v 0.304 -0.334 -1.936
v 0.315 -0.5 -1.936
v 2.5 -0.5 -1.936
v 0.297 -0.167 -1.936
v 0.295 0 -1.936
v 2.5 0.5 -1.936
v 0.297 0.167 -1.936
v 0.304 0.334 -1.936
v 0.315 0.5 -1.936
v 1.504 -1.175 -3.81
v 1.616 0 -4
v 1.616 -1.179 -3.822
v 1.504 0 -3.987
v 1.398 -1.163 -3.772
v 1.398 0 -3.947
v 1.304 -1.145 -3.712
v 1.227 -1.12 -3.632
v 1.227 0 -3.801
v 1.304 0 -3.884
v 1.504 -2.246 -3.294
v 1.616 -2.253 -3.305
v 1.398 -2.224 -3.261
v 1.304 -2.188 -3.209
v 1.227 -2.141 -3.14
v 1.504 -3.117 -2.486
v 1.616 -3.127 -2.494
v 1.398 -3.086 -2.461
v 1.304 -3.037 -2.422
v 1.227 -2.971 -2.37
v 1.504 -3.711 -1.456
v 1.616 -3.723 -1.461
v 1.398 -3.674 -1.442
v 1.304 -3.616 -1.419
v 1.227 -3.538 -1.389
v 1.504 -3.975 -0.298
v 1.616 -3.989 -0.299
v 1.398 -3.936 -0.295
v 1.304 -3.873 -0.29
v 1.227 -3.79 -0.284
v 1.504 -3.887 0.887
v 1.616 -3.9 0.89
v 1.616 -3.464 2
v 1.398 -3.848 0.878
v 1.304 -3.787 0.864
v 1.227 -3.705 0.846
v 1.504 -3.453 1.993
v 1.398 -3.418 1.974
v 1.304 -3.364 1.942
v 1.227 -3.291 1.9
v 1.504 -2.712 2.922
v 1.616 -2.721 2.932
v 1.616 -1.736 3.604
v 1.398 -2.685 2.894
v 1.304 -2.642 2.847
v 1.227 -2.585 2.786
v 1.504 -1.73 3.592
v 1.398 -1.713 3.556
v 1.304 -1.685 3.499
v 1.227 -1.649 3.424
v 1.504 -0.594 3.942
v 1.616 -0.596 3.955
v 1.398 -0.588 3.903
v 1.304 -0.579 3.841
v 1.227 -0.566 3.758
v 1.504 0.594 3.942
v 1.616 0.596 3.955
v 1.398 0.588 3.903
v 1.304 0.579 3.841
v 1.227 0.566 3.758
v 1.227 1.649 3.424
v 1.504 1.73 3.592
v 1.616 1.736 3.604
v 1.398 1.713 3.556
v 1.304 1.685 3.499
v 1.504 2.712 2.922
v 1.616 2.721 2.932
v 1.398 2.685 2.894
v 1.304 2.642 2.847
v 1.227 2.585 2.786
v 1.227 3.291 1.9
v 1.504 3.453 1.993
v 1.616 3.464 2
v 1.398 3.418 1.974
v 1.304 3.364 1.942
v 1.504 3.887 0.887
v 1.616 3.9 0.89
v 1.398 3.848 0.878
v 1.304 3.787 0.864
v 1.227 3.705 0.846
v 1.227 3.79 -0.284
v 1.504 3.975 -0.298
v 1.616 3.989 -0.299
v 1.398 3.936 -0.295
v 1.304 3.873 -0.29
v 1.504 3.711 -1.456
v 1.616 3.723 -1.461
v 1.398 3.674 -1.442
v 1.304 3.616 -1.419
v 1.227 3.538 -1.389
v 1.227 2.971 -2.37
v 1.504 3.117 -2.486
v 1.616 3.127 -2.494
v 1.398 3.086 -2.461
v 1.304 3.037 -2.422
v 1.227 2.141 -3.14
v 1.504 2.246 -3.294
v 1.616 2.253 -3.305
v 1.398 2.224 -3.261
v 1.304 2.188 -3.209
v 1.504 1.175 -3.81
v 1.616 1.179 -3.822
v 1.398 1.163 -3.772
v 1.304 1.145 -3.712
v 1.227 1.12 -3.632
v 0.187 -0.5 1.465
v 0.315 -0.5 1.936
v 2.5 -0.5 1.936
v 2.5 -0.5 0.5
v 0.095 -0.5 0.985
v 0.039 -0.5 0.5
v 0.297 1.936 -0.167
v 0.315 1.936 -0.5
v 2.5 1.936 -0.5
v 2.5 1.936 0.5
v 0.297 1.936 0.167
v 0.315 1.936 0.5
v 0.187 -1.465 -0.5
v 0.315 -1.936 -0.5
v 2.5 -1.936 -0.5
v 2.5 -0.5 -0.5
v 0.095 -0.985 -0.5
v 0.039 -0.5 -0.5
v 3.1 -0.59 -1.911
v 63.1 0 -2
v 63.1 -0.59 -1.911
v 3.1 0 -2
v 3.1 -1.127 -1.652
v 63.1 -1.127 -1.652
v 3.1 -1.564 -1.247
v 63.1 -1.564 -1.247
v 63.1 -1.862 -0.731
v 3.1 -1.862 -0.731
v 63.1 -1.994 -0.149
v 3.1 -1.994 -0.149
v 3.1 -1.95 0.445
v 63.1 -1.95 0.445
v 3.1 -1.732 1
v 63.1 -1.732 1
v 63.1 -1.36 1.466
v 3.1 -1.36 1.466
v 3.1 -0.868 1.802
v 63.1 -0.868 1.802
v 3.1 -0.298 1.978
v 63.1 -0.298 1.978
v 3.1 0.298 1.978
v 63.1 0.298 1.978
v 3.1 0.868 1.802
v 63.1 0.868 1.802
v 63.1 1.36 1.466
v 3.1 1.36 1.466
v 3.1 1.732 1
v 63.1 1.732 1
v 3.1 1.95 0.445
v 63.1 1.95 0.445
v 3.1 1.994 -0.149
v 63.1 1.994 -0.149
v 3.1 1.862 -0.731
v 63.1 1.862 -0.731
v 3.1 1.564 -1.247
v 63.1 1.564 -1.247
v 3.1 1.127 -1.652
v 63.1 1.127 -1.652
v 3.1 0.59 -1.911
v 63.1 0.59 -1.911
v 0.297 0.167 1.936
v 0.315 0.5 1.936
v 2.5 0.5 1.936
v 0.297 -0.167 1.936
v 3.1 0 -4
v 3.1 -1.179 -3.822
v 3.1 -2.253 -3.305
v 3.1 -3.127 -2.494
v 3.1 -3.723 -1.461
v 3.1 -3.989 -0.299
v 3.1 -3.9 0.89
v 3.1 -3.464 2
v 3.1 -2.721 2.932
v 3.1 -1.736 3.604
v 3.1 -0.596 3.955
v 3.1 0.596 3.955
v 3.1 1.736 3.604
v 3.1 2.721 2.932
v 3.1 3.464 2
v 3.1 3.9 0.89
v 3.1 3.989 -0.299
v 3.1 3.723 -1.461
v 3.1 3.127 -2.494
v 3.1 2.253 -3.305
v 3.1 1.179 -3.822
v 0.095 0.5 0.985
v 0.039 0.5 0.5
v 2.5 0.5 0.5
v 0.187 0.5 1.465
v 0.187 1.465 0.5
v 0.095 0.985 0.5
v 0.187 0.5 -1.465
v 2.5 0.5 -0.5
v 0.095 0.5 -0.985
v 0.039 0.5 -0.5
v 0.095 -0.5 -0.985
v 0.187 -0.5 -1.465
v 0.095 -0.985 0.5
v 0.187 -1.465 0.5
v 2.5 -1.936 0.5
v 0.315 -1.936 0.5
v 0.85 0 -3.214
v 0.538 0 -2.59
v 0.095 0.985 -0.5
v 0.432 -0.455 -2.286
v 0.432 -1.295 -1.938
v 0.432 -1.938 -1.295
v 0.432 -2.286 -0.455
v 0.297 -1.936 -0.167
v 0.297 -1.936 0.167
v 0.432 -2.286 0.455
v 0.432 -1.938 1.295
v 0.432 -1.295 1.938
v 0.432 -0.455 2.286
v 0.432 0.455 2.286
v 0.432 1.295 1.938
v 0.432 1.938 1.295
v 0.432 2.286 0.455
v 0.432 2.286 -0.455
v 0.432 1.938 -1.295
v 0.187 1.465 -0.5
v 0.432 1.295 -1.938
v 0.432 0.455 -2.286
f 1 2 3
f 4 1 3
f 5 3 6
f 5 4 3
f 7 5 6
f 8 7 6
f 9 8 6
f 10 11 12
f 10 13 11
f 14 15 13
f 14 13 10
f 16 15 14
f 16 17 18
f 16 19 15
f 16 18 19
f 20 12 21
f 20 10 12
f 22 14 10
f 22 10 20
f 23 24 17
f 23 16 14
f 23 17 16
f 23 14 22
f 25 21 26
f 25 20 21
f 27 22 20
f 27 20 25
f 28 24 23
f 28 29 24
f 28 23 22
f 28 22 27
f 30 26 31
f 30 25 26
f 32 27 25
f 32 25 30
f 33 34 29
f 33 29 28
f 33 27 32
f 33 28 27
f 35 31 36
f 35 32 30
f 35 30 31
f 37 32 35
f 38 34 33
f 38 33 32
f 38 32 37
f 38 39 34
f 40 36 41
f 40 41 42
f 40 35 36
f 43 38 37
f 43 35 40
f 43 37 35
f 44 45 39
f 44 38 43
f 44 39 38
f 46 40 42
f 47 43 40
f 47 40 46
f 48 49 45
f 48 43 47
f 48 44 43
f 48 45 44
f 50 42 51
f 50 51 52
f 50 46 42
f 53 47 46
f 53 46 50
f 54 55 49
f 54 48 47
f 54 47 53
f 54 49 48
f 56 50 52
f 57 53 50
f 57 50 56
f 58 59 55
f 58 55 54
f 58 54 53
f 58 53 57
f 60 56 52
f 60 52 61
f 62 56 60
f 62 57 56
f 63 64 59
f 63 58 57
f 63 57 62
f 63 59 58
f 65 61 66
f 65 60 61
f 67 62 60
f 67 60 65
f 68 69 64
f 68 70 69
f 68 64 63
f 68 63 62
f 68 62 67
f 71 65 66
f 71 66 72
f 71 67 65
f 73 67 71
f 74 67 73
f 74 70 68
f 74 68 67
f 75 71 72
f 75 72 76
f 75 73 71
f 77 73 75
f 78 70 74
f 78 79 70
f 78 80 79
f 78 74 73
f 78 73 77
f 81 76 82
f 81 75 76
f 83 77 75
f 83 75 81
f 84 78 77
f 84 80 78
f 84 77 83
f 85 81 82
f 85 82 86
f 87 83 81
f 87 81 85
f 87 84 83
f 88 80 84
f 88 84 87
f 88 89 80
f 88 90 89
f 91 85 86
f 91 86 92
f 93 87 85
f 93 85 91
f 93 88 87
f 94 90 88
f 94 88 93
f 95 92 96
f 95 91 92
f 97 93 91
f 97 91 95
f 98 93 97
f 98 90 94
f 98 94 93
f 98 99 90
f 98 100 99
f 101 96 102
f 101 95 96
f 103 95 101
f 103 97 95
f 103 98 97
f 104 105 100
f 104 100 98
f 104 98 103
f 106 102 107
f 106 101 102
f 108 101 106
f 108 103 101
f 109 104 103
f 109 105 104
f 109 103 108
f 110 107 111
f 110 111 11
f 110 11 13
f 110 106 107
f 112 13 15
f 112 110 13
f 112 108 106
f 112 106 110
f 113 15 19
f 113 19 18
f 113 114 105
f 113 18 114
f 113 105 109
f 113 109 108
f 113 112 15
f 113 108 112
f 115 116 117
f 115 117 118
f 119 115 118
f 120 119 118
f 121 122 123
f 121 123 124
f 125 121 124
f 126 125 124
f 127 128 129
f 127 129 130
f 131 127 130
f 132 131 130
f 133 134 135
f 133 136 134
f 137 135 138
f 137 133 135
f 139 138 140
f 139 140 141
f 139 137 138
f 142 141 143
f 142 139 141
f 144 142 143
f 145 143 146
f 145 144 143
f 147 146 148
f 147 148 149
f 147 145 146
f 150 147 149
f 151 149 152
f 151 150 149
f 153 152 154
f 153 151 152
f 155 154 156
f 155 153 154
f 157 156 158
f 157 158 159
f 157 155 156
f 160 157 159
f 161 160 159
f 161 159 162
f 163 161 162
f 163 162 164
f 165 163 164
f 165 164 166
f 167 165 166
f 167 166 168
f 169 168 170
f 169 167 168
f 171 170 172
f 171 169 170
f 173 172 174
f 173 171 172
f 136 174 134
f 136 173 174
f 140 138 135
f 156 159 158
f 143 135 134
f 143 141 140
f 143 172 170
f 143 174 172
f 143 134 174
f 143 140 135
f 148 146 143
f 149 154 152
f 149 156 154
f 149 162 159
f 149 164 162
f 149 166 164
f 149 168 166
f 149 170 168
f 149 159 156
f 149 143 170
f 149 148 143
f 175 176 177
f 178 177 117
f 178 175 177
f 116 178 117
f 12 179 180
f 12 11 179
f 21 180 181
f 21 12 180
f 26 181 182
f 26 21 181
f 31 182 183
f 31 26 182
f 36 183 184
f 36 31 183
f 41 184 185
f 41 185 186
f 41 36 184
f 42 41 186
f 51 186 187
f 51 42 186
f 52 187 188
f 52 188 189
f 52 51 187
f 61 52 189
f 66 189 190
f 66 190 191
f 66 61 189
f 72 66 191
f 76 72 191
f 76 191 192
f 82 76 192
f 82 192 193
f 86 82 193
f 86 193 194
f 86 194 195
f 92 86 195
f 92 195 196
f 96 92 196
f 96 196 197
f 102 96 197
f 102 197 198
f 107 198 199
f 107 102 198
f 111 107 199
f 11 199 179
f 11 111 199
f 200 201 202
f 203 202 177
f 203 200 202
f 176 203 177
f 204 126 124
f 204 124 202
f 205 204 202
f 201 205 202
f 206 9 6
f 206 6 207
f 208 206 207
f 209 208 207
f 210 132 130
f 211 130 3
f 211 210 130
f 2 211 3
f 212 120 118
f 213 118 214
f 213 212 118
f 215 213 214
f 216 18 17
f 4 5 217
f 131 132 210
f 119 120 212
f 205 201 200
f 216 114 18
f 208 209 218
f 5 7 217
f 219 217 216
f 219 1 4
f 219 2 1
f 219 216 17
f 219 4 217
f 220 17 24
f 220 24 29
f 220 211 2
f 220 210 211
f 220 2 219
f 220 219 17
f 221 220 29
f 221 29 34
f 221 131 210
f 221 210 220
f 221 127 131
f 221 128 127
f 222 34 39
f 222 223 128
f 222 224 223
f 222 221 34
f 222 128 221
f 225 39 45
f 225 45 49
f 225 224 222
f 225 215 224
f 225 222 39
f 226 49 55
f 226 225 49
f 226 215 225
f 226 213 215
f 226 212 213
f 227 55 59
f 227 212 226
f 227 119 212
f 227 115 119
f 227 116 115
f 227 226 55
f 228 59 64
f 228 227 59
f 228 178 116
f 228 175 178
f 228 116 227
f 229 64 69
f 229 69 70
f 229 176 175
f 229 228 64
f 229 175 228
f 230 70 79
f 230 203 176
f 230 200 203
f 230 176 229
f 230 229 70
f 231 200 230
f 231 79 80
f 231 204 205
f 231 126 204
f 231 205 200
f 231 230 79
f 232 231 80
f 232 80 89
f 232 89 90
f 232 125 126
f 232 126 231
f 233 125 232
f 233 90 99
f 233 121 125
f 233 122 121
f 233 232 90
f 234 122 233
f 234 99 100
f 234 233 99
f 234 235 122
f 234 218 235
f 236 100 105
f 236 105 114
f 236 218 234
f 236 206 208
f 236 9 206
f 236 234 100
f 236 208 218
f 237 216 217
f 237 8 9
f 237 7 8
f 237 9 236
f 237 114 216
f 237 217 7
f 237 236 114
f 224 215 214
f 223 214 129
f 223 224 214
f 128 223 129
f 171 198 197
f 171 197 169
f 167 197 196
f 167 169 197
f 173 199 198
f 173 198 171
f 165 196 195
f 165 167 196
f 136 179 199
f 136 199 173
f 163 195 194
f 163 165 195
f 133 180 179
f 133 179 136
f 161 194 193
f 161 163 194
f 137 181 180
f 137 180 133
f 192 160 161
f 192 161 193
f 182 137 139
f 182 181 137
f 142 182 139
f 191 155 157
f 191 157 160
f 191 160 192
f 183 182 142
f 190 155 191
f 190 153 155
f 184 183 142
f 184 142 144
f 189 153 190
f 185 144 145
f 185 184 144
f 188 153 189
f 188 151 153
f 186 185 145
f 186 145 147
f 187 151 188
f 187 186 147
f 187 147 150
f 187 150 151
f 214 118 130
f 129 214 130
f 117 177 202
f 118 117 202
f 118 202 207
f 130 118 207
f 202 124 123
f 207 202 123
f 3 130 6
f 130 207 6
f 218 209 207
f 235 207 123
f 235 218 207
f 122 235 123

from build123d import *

# Parameters (mm, degrees)
CUT_EXTRUDE4_DEPTH = 2.5


with BuildPart() as part:
    # Sketch1 → Revolve1 (revolve)
    with BuildSketch(Plane.XY, mode=Mode.PRIVATE) as revolve1_sk:
        with BuildLine():
            Line((3.1, 2), (3.1, 4))
            Line((3.1, 4), (1.616353821, 4))
            ThreePointArc((1.616353821, 4), (1.397629036, 3.947269784), (1.226960106, 3.800664452))
            ThreePointArc((1.226960106, 3.800664452), (0.314340807, 1.996902688), (0, 0))
            Line((0, 0), (63.1, 0))
            Line((63.1, 0), (63.1, 2))
            Line((63.1, 2), (3.1, 2))
        make_face()
    revolve(revolve1_sk.sketch.rotate(Axis((63.1, 0, 0), (-1, 0, 0)), 90), axis=Axis((63.1, 0, 0), (-1, 0, 0)))

    # Sketch2 → Cut-Extrude4 (cut)
    with BuildSketch(Plane(origin=(0, 0, 0), x_dir=(0, 0, -1), z_dir=(1, 0, 0))):
        Polygon((-0.5, -0.5), (-0.5, -1.936491673), (0.5, -1.936491673), (0.5, -0.5), (1.936491673, -0.5), (1.936491673, 0.5), (0.5, 0.5), (0.5, 1.936491673), (-0.5, 1.936491673), (-0.5, 0.5), (-1.936491673, 0.5), (-1.936491673, -0.5), align=None)
    extrude(amount=CUT_EXTRUDE4_DEPTH, mode=Mode.SUBTRACT)


solid = part.part
